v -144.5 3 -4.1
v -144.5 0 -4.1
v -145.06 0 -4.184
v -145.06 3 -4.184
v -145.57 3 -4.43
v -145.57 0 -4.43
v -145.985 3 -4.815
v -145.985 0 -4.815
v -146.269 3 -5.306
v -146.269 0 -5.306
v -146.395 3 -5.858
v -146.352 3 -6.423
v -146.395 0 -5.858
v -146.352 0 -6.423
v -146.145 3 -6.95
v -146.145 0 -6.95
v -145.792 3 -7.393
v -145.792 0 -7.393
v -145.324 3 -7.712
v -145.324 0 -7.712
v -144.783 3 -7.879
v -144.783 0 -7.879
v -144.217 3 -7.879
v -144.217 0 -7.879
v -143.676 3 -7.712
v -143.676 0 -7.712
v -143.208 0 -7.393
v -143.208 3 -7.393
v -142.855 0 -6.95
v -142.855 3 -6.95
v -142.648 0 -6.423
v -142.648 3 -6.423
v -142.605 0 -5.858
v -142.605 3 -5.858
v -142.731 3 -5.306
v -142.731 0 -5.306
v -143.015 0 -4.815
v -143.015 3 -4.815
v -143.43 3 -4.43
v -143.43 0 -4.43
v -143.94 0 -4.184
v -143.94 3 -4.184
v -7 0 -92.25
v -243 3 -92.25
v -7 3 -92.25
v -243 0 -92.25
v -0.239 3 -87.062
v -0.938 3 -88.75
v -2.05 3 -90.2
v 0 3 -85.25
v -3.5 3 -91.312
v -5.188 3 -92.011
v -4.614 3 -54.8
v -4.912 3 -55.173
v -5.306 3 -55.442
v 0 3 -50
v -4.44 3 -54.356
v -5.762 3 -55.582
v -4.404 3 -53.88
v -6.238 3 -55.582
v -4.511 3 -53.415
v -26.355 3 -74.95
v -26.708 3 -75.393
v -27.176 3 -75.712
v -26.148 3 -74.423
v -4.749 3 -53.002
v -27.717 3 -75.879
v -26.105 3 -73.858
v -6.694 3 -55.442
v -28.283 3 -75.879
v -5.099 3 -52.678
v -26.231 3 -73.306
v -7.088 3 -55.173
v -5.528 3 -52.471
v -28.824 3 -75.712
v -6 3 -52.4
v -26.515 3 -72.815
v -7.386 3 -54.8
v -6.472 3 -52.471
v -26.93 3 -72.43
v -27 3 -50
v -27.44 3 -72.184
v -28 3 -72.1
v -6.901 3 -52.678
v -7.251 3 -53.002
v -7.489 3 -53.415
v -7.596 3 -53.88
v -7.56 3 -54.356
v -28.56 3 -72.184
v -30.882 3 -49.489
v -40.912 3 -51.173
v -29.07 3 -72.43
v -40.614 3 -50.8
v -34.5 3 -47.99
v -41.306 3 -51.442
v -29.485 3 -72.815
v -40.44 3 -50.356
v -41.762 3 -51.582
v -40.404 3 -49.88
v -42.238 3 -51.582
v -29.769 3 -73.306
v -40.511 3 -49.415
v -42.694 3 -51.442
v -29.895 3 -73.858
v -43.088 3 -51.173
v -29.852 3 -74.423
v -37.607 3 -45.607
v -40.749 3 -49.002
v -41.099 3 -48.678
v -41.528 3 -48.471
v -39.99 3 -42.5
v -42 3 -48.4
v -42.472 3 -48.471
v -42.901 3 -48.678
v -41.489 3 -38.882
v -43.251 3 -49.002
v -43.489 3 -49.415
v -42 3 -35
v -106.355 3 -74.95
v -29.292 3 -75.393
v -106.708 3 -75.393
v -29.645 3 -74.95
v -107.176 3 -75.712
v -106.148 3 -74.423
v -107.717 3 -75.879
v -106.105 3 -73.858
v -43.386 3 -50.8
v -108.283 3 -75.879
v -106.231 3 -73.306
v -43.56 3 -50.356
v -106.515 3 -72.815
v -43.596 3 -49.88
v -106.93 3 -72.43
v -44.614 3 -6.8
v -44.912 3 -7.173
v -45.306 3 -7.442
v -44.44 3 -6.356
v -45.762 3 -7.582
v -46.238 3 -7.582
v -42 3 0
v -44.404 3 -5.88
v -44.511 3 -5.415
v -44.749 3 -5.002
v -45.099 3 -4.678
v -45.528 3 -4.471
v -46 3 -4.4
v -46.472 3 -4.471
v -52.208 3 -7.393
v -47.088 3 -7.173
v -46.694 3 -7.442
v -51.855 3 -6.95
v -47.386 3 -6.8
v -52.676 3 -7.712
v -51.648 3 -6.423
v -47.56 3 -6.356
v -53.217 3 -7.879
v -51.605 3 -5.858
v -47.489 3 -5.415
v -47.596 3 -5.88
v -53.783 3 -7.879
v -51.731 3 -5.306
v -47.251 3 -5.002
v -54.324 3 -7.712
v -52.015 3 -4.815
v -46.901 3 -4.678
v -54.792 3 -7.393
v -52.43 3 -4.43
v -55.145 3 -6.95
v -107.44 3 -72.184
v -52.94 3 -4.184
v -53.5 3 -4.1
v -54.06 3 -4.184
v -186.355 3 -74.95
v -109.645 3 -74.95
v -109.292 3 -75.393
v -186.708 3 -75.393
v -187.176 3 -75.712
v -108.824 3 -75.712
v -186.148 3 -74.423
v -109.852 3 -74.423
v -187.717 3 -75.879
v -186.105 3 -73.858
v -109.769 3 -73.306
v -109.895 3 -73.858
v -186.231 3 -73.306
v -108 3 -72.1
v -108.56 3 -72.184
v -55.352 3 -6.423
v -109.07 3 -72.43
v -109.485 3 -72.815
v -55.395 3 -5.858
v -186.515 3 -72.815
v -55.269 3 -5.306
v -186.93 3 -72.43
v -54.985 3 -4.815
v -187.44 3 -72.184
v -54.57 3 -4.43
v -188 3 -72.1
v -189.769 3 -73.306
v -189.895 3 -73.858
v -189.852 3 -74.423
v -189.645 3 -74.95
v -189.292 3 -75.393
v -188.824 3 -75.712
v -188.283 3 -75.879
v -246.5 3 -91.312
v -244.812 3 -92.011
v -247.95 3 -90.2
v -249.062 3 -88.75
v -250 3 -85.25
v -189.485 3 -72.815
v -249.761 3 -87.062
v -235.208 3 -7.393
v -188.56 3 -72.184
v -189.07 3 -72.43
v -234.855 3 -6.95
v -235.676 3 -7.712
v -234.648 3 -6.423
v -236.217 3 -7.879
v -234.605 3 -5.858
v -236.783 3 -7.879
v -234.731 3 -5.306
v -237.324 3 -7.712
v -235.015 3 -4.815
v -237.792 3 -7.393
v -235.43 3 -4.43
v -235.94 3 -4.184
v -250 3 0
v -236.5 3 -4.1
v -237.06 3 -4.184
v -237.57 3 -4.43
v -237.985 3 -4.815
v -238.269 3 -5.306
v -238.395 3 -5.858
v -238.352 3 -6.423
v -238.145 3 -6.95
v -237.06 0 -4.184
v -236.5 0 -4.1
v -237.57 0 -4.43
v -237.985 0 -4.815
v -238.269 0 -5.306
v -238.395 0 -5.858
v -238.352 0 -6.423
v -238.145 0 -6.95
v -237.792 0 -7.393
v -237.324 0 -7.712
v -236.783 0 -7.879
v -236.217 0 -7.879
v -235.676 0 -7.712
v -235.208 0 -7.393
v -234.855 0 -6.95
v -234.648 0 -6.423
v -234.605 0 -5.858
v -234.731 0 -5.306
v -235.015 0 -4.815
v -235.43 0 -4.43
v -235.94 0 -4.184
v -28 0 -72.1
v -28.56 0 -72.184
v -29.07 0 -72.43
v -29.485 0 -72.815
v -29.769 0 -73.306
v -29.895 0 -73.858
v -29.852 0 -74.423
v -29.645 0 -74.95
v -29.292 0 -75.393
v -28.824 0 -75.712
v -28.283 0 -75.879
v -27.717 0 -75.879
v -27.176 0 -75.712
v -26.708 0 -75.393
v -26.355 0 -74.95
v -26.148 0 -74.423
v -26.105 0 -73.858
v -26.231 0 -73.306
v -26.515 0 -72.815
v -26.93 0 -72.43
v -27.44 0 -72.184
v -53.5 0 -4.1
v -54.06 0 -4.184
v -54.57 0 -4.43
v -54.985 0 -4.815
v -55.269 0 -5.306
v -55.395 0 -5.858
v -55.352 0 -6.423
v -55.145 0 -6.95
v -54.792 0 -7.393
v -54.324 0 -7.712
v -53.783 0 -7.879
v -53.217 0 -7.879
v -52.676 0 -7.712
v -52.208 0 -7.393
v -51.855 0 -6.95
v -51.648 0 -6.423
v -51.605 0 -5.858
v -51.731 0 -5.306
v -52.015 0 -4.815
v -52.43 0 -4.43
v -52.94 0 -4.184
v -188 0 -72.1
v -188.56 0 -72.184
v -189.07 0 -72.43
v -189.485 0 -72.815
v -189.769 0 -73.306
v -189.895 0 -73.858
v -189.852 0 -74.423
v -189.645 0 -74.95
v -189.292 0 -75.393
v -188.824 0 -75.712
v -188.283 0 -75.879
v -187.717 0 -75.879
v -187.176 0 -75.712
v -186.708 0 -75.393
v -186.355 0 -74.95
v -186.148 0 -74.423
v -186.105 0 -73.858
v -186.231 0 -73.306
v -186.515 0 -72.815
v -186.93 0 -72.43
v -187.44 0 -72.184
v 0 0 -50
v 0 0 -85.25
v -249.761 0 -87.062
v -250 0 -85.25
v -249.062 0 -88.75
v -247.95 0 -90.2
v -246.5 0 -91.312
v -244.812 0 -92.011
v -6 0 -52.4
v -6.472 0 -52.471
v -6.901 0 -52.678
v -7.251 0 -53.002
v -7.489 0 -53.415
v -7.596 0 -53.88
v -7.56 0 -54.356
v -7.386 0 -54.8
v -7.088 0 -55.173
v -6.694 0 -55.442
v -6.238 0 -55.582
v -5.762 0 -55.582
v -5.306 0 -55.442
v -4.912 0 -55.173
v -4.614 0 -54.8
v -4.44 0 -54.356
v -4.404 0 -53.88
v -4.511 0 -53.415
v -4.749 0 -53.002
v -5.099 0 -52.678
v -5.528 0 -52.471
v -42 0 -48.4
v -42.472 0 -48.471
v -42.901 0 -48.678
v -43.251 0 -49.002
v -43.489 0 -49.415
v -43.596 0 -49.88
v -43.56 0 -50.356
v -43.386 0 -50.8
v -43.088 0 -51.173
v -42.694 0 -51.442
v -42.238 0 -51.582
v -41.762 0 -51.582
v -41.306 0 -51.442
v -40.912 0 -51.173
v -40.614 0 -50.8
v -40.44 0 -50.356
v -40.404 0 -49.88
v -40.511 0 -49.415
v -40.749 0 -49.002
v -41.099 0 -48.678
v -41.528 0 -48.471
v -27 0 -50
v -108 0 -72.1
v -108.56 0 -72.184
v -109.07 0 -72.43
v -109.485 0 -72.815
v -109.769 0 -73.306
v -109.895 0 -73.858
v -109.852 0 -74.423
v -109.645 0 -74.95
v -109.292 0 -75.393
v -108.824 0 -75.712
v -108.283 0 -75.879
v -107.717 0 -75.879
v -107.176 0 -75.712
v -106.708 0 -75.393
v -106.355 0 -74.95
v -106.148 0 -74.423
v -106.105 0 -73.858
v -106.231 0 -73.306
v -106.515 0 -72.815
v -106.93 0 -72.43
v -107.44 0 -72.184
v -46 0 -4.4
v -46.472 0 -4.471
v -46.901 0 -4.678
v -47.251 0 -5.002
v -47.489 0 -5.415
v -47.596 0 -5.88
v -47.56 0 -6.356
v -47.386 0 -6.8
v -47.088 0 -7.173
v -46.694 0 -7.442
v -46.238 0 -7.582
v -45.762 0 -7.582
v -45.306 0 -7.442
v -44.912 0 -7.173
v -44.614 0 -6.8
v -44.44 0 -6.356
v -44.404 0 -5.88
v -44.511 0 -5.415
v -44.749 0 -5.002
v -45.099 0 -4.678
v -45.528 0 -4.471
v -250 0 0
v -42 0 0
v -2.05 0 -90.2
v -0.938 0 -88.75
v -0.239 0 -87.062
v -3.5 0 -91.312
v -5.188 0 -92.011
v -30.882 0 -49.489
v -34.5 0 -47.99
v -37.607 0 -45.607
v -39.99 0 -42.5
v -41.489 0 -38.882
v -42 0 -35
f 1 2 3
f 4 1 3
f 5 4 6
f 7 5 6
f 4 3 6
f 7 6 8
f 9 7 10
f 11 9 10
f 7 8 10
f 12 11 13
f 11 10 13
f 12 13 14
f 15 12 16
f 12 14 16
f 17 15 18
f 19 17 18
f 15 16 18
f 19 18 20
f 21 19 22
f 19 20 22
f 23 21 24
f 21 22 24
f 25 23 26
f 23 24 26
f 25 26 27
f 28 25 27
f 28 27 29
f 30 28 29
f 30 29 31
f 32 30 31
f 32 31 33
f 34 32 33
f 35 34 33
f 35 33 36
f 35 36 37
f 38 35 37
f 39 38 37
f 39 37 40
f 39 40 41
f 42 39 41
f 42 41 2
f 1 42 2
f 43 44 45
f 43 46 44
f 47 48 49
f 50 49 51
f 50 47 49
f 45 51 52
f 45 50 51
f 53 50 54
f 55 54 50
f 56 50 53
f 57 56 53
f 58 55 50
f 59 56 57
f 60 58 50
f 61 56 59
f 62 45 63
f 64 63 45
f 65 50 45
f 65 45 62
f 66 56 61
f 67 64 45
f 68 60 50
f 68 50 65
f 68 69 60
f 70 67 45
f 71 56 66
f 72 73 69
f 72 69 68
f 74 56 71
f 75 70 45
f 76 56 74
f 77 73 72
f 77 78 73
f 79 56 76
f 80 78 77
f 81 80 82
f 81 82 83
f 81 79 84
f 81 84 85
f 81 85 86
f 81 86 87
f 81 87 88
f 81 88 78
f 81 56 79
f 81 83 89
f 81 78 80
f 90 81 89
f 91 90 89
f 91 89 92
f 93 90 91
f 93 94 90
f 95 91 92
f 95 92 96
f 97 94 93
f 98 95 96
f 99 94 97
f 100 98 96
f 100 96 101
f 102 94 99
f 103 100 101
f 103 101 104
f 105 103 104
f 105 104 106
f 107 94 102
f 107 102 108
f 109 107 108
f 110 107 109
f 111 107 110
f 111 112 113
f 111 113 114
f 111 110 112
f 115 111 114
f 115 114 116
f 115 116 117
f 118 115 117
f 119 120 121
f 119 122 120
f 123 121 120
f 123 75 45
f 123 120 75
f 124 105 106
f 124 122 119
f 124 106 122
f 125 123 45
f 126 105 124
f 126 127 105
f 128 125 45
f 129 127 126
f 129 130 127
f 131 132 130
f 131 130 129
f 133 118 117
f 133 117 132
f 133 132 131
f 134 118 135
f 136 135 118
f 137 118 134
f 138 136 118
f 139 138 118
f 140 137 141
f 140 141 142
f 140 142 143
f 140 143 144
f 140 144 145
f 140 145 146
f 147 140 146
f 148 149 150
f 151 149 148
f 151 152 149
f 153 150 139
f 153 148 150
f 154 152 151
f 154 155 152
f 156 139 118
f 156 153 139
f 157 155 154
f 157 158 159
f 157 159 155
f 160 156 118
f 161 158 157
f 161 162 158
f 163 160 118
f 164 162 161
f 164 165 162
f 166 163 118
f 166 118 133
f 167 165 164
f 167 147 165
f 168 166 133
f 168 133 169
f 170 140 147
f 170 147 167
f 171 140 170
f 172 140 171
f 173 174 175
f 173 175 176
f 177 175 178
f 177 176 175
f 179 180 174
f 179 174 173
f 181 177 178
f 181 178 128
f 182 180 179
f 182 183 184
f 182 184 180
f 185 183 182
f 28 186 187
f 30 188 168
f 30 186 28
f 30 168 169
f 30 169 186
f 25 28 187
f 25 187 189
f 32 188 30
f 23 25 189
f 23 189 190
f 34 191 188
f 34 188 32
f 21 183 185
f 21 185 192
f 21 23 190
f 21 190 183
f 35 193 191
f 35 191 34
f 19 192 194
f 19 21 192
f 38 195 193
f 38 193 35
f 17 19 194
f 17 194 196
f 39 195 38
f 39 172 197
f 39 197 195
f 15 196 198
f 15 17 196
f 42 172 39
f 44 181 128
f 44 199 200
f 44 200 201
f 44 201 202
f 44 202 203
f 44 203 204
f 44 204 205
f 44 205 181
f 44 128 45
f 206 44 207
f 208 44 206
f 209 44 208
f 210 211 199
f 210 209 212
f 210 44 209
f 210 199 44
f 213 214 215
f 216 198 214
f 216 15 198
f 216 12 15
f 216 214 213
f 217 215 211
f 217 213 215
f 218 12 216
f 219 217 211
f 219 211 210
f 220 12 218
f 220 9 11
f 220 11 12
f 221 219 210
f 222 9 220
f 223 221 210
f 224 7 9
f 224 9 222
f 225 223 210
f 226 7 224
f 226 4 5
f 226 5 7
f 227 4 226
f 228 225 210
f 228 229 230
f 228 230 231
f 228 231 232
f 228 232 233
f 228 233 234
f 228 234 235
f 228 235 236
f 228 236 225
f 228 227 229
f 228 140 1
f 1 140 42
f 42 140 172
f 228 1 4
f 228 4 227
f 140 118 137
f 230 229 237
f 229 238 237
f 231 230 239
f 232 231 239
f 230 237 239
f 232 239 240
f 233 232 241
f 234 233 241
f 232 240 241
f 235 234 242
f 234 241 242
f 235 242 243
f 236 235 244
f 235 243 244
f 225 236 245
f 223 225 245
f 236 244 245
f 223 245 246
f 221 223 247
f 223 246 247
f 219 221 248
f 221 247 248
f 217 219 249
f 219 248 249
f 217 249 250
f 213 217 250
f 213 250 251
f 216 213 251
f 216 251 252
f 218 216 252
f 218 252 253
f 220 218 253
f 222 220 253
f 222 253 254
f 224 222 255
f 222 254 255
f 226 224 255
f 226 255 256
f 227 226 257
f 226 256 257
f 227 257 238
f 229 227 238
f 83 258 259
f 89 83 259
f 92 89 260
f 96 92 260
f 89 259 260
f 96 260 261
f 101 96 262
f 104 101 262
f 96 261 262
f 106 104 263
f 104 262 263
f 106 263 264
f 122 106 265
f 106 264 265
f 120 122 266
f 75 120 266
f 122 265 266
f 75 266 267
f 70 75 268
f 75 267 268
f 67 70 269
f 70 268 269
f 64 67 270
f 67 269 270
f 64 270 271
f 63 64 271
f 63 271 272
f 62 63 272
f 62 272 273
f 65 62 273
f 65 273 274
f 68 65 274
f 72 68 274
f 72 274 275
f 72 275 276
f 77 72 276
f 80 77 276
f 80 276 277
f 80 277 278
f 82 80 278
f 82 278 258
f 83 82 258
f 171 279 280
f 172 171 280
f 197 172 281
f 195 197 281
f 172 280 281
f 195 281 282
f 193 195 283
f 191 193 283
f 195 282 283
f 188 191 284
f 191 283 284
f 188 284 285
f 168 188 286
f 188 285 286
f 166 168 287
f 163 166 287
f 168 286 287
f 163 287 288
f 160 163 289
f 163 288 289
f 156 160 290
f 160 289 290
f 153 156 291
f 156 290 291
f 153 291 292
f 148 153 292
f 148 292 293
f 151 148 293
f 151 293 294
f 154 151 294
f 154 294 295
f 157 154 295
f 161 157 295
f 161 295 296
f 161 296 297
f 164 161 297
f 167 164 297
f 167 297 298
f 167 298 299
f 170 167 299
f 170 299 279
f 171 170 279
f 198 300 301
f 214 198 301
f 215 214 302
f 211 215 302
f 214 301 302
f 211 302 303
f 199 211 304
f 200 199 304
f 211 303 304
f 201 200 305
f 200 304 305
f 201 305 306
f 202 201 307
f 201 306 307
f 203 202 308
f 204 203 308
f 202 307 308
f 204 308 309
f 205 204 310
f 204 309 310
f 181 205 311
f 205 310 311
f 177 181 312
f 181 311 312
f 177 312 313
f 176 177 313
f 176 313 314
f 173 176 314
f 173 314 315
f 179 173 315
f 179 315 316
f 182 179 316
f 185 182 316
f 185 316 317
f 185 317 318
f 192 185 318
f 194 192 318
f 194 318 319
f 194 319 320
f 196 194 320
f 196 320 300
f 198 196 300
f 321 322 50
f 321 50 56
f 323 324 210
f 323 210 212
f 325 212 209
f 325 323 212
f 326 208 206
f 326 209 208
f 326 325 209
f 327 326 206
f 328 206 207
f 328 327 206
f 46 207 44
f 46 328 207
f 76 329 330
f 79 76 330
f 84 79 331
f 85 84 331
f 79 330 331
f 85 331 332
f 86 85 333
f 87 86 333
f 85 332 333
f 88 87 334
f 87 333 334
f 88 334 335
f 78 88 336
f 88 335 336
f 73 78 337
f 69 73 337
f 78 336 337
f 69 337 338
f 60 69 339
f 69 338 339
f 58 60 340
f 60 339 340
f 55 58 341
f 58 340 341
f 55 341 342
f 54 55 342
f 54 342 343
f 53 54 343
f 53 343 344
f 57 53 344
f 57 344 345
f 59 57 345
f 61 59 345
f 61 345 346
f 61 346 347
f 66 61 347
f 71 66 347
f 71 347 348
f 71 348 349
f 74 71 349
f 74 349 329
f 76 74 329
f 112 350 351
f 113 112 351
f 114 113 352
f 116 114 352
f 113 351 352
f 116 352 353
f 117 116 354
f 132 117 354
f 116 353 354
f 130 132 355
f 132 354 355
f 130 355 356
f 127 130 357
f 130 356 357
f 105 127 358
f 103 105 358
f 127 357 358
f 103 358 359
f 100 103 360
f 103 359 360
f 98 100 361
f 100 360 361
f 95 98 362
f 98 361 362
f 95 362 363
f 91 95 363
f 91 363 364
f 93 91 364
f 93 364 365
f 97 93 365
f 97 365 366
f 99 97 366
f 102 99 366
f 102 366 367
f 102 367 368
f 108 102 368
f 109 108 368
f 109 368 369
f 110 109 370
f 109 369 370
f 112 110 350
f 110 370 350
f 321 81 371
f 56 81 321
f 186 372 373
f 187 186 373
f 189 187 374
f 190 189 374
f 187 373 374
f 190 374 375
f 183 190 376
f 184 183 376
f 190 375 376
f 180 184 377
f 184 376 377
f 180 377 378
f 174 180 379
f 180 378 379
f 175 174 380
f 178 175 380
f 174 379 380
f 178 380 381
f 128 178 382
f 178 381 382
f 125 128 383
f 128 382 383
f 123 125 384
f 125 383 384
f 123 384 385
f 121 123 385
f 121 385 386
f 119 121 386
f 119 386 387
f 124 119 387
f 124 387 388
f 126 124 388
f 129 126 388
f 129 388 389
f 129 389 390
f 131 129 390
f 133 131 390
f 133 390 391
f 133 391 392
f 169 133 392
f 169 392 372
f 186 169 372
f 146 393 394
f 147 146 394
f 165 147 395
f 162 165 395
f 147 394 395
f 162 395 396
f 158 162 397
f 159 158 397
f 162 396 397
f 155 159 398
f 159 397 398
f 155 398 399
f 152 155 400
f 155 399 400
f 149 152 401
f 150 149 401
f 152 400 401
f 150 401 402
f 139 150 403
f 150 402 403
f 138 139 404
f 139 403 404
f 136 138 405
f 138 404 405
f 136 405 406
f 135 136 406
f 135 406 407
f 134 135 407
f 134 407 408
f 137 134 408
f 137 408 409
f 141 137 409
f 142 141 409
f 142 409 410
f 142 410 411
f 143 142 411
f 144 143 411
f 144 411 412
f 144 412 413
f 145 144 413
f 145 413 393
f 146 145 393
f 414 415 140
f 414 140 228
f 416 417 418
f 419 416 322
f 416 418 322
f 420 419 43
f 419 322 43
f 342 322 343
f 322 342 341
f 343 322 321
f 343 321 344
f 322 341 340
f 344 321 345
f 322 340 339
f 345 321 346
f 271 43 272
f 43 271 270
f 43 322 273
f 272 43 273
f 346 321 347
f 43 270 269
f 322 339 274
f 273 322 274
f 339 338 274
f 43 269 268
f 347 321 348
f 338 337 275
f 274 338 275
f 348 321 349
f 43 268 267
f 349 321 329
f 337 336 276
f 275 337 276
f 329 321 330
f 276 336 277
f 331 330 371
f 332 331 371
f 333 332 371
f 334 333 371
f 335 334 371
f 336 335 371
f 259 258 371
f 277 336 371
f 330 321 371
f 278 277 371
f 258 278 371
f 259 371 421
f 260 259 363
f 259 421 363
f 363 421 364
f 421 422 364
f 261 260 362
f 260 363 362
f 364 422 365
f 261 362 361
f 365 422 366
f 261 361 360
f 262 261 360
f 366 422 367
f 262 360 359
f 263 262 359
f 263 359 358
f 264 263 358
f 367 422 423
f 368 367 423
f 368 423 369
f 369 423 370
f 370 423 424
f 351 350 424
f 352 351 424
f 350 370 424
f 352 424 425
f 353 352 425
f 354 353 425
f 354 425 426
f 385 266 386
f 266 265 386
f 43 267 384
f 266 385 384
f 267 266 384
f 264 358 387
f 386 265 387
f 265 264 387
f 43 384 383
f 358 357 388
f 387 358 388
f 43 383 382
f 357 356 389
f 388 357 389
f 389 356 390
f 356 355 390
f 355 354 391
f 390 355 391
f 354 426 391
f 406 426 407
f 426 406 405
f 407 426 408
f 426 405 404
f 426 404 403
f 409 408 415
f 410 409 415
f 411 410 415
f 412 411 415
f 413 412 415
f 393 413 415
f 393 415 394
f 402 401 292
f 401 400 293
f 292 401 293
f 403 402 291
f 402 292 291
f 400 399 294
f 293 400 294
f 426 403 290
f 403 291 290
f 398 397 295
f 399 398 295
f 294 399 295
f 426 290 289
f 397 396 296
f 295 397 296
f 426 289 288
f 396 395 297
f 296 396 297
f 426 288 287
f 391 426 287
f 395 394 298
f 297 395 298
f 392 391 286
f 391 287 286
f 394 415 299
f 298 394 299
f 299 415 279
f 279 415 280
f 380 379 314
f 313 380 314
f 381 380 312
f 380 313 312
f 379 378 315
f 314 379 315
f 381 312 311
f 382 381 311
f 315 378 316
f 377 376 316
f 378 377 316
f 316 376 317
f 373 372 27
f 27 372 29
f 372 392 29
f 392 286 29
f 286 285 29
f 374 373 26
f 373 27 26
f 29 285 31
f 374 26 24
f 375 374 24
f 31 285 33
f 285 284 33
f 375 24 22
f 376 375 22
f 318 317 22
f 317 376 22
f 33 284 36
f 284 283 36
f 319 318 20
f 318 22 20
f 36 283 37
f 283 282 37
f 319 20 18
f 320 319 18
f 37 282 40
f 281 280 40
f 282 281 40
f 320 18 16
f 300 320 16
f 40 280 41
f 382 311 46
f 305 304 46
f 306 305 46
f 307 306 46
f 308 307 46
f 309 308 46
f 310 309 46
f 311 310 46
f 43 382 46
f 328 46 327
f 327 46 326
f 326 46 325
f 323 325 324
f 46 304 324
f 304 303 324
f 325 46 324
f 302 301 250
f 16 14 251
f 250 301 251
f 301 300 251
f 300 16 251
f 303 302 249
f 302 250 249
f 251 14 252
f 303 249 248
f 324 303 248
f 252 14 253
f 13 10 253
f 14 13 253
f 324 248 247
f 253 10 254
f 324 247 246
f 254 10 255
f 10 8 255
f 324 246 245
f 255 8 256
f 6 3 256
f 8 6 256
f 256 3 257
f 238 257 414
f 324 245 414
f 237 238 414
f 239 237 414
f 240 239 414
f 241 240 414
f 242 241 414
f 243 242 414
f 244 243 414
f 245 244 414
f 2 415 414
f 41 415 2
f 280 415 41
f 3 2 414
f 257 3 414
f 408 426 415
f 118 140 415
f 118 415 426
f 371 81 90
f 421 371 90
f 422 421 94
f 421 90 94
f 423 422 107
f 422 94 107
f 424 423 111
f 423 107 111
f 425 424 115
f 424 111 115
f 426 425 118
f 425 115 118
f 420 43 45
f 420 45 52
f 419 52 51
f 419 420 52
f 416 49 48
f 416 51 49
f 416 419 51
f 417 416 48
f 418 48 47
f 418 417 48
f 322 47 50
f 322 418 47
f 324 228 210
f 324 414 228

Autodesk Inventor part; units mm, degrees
ref_plane "YZ Plane" through (0, 0, 0) normal (1, 0, 0) x (0, 1, 0)
ref_plane "XZ Plane" through (0, 0, 0) normal (0, 1, 0) x (-1, 0, 0)
ref_plane "XY Plane" through (0, 0, 0) normal (0, 0, 1) x (1, 0, 0)
sketch "Sketch1" plane through (0, 0, 0) normal (0, 1, 0) x (-1, 0, 0)
  line L0 (0, 0) -> (250, 0)
  line L1 (250, 0) -> (250, -85.25)
  line L2 (243, -92.25) -> (7, -92.25)
  line L3 (0, -85.25) -> (0, 0)
  arc A0 (243, -92.25) -> (250, -85.25) centre (243, -85.25) ccw
  arc A1 (0, -85.25) -> (7, -92.25) centre (7, -85.25) ccw
  point P0 (250, -92.25)
  point P1 (0, -92.25)
  dimension "d0" = 250
  dimension "d1" = 92.25
  dimension "d2" = 7
extrude "Extrusion1" add sketch "Sketch1" along normal blind 3
sketch "Sketch2" plane through (0, 3, 0) normal (0, 1, 0) x (1, 0, 0)
  line L0 (-302.172, 6) -> (59.9962, 6) construction
  line L1 (-309.1368, 74) -> (37.3606, 74) construction
  line L2 (-7, 92.25) -> (-243, 92.25) projected
  line L3 (-250, 0) -> (0, 0) projected
  line L4 (0, 0) -> (0, 85.25) projected
  line L5 (-250, 85.25) -> (-250, 0) projected
  point P0 (-28, 74)
  point P1 (-108, 74)
  point P2 (-188, 74)
  point P3 (-53.5, 6)
  point P4 (-144.5, 6)
  point P5 (-236.5, 6)
  dimension "d5" = 18.25
  dimension "d6" = 6
  dimension "d8" = 80
  dimension "d9" = 80
  dimension "d20" = 13.5
  dimension "d22" = 196.5
  dimension "d23" = 62
  dimension "d24" = 105.5
hole "Hole1" at (-28, 3, -74) at (-108, 3, -74) at (-188, 3, -74) at (-53.5, 3, -6) at (-144.5, 3, -6) at (-236.5, 3, -6) direction (0, -1, 0) diameter 3.8 end through all
sketch "Sketch3" plane through (0, 3, 0) normal (0, 1, 0) x (1, 0, 0)
  line L0 (0, 0) -> (-42, 0)
  line L1 (-42, 0) -> (-42, 35)
  line L2 (-27, 50) -> (0, 50)
  line L3 (0, 50) -> (0, 0)
  line L4 (-250, 85.25) -> (-250, 0) projected
  arc A0 (-27, 50) -> (-42, 35) centre (-27, 35) ccw
  dimension "d26" = 50
  dimension "d27" = 208
  dimension "d28" = 15
extrude "Extrusion2" cut sketch "Sketch3" against normal through all
sketch "Sketch4" plane through (0, 3, 0) normal (0, 1, 0) x (1, 0, 0)
  line L0 (-46, -14.9041) -> (-46, 62.5179) construction
  line L1 (7.7091, 54) -> (-71.6012, 54) construction
  line L2 (0, 50) -> (-27, 50) construction
  line L3 (0, 50) -> (-74.4337, 50) construction
  line L4 (-250, 0) -> (-42, 0) construction
  line L5 (-42, 0) -> (-42, 52.8873) construction
  line L6 (0, 50) -> (0, 85.25) projected
  point P0 (0, 0)
  point P1 (-6, 54)
  point P2 (-18, 54)
  point P3 (-46, 18)
  point P4 (-46, 6)
  point P5 (-42, 50)
  dimension "d31" = 4
  dimension "d32" = 4
  dimension "d33" = 6
  dimension "d34" = 6
  dimension "d35" = 18
  dimension "d36" = 18
hole "Hole2" at (-6, 3, -54) at (-46, 3, -6) at (-42, 3, -50) direction (0, -1, 0) diameter 3.2 end through all
properties part number "Electronics cover"
